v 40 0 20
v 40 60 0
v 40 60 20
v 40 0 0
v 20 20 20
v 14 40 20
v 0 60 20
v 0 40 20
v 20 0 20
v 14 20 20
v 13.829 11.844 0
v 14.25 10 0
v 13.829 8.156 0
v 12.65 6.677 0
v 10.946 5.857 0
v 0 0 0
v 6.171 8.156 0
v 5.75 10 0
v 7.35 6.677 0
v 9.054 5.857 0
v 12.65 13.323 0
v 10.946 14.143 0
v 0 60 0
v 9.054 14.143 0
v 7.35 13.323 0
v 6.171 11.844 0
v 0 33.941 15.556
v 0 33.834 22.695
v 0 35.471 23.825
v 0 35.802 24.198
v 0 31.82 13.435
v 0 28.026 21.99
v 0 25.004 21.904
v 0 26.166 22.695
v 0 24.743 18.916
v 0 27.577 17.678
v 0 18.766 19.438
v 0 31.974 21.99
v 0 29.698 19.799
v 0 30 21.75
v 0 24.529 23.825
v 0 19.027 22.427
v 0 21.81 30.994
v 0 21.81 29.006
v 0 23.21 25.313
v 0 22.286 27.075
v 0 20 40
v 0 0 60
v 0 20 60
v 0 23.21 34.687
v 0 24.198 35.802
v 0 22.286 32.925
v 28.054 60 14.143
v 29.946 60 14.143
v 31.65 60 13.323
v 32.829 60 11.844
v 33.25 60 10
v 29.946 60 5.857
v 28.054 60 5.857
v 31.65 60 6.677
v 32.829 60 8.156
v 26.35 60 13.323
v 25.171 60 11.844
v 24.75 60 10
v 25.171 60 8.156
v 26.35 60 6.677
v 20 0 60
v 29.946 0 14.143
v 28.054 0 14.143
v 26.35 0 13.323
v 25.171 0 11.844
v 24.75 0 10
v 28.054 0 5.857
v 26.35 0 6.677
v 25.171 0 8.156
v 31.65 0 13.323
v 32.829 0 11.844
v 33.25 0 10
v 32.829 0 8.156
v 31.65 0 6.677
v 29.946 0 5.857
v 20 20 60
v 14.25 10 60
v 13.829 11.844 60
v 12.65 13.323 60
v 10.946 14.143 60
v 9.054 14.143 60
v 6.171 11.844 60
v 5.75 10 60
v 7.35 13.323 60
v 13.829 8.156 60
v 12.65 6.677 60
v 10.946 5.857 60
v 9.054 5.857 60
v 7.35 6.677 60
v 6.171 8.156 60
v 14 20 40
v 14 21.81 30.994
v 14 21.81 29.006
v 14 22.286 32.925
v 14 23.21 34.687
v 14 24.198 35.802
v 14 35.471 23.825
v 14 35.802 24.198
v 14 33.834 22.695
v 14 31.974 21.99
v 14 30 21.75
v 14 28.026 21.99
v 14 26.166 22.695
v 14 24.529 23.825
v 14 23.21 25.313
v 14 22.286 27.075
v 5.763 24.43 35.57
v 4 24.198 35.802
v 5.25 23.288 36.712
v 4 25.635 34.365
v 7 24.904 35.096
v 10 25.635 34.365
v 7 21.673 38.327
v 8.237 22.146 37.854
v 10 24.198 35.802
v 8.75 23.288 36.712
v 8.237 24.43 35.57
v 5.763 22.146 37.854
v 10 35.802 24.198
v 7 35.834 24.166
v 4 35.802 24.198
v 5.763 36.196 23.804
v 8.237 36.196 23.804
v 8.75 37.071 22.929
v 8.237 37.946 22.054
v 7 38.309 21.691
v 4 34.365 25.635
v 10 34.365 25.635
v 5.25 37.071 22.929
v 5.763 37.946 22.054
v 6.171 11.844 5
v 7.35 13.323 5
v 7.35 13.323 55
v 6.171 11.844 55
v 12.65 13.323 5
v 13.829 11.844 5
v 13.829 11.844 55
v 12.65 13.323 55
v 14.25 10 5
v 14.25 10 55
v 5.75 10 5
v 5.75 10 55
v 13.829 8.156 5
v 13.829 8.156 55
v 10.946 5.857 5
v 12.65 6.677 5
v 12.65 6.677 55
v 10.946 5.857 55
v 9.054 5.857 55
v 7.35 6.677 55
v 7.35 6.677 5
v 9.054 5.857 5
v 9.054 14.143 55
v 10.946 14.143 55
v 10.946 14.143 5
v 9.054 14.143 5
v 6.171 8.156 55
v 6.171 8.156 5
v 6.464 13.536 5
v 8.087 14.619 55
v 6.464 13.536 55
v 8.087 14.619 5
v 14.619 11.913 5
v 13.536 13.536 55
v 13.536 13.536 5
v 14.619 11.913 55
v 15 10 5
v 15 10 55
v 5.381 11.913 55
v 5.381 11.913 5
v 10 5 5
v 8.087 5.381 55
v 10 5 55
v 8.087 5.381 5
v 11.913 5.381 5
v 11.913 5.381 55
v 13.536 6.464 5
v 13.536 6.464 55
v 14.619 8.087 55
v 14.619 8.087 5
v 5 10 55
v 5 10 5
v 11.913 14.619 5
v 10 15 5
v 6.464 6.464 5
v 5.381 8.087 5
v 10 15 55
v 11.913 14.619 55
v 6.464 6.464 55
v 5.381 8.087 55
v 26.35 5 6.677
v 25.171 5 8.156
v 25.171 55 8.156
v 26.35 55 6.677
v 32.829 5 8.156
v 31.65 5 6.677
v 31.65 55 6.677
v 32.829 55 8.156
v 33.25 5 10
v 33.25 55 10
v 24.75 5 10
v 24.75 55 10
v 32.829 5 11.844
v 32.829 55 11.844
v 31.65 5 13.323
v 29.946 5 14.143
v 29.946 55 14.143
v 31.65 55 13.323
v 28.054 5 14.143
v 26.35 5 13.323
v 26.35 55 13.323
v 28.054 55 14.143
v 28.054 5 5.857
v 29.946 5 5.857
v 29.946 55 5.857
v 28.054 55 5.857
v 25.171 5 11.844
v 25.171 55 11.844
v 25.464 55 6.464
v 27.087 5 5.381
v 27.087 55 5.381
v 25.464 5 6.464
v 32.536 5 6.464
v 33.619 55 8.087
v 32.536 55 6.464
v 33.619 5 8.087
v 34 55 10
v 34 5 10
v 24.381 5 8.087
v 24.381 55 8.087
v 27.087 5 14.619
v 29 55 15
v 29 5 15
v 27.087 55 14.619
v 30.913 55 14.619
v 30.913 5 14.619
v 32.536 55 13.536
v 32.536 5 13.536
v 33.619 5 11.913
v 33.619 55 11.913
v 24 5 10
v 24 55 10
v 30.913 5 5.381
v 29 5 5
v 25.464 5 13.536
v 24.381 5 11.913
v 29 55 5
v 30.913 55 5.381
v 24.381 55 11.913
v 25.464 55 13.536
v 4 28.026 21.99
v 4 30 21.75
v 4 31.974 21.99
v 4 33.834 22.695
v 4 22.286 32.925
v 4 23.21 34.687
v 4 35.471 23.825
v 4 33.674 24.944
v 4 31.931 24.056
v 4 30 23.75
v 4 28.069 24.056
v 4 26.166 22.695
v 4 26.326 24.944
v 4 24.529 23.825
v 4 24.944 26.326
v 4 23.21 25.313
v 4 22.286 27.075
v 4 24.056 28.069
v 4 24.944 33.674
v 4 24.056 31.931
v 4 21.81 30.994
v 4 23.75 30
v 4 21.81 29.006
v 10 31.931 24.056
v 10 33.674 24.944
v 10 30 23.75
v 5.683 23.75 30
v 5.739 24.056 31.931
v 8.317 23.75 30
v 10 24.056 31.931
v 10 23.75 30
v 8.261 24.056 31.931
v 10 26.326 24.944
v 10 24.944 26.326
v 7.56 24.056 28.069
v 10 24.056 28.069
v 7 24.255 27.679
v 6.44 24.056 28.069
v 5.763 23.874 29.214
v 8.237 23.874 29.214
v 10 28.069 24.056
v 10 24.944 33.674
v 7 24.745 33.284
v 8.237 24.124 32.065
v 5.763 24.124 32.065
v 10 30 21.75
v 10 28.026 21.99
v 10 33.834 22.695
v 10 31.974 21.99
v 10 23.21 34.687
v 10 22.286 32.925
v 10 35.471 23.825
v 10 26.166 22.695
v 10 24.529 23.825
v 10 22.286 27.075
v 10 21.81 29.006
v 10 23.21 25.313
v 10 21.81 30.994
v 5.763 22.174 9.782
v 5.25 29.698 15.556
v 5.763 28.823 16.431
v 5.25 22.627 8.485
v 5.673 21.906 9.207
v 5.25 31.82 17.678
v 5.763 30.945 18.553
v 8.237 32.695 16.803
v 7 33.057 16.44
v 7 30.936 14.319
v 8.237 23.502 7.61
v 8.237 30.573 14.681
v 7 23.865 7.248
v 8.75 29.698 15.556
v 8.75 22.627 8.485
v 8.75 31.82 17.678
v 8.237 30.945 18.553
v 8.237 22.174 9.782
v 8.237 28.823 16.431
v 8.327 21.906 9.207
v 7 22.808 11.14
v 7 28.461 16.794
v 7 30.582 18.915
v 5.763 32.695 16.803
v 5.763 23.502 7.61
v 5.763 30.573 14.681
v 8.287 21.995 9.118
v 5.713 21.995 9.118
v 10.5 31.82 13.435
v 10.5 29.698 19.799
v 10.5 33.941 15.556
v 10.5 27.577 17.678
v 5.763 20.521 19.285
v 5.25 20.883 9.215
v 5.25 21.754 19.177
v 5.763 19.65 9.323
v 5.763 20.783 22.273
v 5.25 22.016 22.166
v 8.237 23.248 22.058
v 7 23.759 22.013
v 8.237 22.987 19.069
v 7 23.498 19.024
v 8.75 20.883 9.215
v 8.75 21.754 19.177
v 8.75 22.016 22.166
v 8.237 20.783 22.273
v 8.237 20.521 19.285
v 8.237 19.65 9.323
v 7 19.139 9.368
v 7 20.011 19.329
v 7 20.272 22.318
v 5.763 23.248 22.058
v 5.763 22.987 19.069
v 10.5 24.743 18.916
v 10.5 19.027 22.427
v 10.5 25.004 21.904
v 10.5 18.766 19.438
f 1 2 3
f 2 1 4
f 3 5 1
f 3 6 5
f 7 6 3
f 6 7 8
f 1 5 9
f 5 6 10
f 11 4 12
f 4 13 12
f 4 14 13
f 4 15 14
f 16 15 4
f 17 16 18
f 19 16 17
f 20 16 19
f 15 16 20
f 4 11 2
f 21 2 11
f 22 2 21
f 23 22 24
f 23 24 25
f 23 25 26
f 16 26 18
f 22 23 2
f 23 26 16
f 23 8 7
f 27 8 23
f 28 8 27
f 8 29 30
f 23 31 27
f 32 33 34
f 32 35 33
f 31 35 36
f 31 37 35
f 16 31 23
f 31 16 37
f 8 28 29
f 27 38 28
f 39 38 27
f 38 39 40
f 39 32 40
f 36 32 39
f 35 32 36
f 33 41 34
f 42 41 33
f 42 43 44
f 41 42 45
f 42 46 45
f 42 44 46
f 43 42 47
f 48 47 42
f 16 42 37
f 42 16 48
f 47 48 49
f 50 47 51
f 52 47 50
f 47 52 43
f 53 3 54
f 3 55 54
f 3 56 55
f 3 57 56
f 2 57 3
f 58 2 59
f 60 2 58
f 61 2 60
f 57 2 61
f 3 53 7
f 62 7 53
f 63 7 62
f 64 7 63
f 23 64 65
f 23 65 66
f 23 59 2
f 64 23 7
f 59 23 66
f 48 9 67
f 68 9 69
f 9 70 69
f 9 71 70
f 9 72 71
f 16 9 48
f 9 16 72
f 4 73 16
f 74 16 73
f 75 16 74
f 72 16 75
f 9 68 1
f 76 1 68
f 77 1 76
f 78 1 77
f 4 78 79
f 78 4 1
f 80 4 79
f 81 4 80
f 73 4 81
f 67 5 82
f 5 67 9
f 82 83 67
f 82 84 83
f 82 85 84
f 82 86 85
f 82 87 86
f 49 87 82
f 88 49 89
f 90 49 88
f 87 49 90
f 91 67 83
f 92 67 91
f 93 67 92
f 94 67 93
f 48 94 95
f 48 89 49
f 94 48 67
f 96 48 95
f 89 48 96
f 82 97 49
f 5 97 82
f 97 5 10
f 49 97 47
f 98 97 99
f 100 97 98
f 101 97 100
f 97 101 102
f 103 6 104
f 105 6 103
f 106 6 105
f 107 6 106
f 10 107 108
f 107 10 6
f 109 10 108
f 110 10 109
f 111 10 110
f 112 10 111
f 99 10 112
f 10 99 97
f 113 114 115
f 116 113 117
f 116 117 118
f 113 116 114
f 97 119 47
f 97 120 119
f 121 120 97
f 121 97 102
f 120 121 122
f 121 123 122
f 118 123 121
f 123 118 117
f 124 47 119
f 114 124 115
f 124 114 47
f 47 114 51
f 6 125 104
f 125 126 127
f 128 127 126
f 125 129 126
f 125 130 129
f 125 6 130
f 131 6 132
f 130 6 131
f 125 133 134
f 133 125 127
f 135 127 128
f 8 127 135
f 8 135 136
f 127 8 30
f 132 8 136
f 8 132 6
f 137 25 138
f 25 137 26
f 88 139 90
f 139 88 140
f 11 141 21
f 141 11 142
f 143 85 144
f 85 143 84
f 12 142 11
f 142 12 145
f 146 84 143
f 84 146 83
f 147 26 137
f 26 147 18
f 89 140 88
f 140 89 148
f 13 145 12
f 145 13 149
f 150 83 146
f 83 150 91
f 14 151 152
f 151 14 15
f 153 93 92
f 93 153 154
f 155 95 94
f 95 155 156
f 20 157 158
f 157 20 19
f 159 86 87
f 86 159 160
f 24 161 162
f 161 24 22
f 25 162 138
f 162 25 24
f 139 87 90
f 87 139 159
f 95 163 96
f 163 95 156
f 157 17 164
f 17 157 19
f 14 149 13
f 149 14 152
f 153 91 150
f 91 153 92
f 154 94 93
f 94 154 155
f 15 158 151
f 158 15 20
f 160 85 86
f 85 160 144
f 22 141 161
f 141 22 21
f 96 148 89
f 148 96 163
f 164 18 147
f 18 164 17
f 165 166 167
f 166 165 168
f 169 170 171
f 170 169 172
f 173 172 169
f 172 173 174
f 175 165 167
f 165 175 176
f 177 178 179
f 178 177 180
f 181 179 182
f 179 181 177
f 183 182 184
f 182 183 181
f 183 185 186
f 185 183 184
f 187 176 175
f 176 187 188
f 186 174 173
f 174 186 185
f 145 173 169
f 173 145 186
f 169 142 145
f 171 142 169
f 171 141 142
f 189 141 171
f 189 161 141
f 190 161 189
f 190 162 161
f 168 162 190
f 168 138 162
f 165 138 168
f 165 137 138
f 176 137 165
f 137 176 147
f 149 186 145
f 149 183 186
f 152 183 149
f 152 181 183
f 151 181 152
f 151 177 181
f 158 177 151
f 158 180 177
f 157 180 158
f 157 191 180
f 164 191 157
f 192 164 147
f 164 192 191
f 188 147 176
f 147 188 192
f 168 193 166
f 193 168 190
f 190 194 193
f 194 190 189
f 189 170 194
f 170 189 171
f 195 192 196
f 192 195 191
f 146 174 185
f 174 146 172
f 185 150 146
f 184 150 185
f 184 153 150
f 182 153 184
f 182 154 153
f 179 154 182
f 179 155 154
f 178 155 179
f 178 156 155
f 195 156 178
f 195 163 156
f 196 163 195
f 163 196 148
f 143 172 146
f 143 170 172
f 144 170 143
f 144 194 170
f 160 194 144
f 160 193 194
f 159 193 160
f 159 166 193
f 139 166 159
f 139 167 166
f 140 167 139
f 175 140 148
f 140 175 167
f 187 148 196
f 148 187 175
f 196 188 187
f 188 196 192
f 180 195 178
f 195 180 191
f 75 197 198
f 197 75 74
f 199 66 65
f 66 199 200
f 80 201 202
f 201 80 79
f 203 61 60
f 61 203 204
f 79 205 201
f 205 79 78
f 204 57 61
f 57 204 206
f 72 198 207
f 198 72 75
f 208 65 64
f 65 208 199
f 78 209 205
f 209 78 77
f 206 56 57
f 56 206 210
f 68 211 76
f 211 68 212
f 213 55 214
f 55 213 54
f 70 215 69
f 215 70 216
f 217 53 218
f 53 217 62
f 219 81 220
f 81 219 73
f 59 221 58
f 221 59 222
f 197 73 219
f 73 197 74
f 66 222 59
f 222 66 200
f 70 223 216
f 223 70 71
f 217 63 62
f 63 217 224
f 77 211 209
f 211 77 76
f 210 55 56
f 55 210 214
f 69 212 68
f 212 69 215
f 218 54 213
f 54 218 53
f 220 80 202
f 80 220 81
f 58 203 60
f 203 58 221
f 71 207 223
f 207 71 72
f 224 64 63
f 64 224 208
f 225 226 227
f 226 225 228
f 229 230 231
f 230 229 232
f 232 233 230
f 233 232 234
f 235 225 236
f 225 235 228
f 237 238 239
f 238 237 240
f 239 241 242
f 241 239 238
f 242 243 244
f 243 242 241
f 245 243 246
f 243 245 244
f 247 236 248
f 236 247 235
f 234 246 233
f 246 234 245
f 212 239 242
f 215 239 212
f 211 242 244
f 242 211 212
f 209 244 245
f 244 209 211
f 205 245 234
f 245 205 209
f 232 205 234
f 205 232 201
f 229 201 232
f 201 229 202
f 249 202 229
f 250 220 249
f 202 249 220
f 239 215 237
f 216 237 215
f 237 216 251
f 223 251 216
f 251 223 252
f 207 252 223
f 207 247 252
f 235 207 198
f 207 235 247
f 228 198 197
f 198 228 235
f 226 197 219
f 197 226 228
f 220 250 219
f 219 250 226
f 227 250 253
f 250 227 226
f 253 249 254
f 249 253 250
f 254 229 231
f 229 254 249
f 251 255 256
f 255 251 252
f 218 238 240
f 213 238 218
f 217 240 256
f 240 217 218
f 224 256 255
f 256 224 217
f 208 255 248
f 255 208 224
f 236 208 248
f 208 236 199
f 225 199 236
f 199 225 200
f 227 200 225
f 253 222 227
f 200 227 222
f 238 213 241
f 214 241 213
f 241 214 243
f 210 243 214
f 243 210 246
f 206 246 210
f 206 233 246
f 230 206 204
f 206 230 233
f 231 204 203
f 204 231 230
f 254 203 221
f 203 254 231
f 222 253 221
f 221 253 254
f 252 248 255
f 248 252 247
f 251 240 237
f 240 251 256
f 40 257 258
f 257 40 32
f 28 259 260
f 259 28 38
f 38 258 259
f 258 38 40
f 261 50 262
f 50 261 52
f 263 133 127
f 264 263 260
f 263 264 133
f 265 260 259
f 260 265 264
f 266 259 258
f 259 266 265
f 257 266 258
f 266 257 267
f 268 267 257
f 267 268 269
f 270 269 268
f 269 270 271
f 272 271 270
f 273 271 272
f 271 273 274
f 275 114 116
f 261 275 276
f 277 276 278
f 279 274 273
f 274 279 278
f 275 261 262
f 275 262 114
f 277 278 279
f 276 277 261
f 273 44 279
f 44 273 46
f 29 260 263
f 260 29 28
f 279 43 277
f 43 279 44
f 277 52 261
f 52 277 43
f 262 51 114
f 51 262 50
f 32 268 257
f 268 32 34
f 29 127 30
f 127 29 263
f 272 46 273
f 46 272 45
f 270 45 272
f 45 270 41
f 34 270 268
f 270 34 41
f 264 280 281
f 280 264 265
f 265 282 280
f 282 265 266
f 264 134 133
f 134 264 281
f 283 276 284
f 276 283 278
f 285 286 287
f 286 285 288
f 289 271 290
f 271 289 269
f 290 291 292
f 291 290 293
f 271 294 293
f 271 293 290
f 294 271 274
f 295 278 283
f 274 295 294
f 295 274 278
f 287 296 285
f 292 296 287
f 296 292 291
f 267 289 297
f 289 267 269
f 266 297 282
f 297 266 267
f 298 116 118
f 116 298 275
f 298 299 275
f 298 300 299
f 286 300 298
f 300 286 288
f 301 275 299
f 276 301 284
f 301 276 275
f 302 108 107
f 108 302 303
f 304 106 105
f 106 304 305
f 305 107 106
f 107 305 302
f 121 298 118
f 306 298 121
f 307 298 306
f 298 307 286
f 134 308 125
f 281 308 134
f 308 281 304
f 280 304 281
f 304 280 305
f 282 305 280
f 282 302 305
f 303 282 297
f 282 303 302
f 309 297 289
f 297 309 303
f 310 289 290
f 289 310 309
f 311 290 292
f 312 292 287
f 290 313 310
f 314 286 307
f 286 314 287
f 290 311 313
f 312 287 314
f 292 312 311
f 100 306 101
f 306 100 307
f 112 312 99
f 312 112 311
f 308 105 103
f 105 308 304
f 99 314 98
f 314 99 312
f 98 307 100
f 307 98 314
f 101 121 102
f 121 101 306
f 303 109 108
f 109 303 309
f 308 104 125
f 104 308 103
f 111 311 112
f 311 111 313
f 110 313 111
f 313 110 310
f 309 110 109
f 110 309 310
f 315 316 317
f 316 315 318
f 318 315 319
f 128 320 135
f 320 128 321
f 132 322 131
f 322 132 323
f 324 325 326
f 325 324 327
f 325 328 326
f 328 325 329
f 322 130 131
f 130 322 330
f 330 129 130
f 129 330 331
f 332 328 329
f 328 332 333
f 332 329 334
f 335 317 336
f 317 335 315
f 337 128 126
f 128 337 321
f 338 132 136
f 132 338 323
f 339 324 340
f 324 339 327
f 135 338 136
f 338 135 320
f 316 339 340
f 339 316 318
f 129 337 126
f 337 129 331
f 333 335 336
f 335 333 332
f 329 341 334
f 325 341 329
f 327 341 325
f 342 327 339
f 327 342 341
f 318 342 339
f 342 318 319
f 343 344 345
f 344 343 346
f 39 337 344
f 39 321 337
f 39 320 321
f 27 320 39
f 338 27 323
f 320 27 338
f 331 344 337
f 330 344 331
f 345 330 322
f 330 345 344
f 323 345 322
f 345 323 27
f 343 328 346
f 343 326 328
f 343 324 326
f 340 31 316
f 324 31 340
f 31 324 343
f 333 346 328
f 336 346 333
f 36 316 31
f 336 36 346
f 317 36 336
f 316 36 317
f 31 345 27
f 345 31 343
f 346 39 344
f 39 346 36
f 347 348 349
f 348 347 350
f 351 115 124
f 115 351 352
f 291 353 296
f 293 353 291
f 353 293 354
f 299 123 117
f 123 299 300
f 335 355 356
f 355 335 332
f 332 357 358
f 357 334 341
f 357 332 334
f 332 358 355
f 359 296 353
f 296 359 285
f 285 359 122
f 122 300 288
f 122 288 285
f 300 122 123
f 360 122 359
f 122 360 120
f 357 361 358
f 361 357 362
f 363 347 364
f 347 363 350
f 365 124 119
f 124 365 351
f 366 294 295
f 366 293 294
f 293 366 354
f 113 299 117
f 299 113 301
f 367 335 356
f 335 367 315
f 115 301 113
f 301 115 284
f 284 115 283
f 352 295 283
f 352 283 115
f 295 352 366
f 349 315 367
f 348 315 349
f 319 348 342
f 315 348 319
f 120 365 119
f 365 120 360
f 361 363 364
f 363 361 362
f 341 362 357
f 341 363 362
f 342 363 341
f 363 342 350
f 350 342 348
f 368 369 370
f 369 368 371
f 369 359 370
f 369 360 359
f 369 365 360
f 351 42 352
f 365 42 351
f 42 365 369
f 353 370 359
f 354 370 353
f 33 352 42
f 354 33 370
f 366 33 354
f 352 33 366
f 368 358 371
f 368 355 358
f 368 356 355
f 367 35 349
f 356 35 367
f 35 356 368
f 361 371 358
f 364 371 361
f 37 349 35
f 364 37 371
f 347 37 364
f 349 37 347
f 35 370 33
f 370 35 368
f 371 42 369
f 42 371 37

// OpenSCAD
epsilon=0.1;

difference() {
    union() {
        cube([40,60,20]);
        cube([20,20,60]);
        hull() {
            translate([0,0,20])
                cube([14,20,20]);
            translate([0,20,0])
                cube([14,20,20]);
        }
    }
    
    translate([10,10,0])
        rotate([0,0,0]) {
            translate([0,0,-epsilon])
                cylinder(d=8.5,h=60+2*epsilon);
            translate([0,0,5])
                cylinder(d=10,h=60-2*5);
        }
    
    translate([10+19,0,10])
        rotate([-90,0,0]) {
            translate([0,0,-epsilon])
                cylinder(d=8.5,h=60+2*epsilon);
            translate([0,0,5])
                cylinder(d=10,h=60-2*5);
        }
        
        translate([0,30,30])
            rotate([0,90,0]) {
                translate([0,0,-epsilon])
                    cylinder(d=16+0.5, h=4+epsilon);
                translate([0,0,4-1])
                    cylinder(d=12+0.5, h=6+2);
                translate([0,0,10])
                    cylinder(d=16+0.5, h=4+epsilon);
            }
        
        rotate([-45,0,0])
            translate([7,10,42-10])
                screw_hole();
        rotate([-5,0,0])
            translate([7,17.5+2.5,42-21])
                screw_hole();
}

module screw_hole() {
    translate([0,0,-10])
        cylinder(d=3.5, h=50, $fn=8);
    translate([-15+3.5,-3,0])
        cube([15,6,3]);
}
